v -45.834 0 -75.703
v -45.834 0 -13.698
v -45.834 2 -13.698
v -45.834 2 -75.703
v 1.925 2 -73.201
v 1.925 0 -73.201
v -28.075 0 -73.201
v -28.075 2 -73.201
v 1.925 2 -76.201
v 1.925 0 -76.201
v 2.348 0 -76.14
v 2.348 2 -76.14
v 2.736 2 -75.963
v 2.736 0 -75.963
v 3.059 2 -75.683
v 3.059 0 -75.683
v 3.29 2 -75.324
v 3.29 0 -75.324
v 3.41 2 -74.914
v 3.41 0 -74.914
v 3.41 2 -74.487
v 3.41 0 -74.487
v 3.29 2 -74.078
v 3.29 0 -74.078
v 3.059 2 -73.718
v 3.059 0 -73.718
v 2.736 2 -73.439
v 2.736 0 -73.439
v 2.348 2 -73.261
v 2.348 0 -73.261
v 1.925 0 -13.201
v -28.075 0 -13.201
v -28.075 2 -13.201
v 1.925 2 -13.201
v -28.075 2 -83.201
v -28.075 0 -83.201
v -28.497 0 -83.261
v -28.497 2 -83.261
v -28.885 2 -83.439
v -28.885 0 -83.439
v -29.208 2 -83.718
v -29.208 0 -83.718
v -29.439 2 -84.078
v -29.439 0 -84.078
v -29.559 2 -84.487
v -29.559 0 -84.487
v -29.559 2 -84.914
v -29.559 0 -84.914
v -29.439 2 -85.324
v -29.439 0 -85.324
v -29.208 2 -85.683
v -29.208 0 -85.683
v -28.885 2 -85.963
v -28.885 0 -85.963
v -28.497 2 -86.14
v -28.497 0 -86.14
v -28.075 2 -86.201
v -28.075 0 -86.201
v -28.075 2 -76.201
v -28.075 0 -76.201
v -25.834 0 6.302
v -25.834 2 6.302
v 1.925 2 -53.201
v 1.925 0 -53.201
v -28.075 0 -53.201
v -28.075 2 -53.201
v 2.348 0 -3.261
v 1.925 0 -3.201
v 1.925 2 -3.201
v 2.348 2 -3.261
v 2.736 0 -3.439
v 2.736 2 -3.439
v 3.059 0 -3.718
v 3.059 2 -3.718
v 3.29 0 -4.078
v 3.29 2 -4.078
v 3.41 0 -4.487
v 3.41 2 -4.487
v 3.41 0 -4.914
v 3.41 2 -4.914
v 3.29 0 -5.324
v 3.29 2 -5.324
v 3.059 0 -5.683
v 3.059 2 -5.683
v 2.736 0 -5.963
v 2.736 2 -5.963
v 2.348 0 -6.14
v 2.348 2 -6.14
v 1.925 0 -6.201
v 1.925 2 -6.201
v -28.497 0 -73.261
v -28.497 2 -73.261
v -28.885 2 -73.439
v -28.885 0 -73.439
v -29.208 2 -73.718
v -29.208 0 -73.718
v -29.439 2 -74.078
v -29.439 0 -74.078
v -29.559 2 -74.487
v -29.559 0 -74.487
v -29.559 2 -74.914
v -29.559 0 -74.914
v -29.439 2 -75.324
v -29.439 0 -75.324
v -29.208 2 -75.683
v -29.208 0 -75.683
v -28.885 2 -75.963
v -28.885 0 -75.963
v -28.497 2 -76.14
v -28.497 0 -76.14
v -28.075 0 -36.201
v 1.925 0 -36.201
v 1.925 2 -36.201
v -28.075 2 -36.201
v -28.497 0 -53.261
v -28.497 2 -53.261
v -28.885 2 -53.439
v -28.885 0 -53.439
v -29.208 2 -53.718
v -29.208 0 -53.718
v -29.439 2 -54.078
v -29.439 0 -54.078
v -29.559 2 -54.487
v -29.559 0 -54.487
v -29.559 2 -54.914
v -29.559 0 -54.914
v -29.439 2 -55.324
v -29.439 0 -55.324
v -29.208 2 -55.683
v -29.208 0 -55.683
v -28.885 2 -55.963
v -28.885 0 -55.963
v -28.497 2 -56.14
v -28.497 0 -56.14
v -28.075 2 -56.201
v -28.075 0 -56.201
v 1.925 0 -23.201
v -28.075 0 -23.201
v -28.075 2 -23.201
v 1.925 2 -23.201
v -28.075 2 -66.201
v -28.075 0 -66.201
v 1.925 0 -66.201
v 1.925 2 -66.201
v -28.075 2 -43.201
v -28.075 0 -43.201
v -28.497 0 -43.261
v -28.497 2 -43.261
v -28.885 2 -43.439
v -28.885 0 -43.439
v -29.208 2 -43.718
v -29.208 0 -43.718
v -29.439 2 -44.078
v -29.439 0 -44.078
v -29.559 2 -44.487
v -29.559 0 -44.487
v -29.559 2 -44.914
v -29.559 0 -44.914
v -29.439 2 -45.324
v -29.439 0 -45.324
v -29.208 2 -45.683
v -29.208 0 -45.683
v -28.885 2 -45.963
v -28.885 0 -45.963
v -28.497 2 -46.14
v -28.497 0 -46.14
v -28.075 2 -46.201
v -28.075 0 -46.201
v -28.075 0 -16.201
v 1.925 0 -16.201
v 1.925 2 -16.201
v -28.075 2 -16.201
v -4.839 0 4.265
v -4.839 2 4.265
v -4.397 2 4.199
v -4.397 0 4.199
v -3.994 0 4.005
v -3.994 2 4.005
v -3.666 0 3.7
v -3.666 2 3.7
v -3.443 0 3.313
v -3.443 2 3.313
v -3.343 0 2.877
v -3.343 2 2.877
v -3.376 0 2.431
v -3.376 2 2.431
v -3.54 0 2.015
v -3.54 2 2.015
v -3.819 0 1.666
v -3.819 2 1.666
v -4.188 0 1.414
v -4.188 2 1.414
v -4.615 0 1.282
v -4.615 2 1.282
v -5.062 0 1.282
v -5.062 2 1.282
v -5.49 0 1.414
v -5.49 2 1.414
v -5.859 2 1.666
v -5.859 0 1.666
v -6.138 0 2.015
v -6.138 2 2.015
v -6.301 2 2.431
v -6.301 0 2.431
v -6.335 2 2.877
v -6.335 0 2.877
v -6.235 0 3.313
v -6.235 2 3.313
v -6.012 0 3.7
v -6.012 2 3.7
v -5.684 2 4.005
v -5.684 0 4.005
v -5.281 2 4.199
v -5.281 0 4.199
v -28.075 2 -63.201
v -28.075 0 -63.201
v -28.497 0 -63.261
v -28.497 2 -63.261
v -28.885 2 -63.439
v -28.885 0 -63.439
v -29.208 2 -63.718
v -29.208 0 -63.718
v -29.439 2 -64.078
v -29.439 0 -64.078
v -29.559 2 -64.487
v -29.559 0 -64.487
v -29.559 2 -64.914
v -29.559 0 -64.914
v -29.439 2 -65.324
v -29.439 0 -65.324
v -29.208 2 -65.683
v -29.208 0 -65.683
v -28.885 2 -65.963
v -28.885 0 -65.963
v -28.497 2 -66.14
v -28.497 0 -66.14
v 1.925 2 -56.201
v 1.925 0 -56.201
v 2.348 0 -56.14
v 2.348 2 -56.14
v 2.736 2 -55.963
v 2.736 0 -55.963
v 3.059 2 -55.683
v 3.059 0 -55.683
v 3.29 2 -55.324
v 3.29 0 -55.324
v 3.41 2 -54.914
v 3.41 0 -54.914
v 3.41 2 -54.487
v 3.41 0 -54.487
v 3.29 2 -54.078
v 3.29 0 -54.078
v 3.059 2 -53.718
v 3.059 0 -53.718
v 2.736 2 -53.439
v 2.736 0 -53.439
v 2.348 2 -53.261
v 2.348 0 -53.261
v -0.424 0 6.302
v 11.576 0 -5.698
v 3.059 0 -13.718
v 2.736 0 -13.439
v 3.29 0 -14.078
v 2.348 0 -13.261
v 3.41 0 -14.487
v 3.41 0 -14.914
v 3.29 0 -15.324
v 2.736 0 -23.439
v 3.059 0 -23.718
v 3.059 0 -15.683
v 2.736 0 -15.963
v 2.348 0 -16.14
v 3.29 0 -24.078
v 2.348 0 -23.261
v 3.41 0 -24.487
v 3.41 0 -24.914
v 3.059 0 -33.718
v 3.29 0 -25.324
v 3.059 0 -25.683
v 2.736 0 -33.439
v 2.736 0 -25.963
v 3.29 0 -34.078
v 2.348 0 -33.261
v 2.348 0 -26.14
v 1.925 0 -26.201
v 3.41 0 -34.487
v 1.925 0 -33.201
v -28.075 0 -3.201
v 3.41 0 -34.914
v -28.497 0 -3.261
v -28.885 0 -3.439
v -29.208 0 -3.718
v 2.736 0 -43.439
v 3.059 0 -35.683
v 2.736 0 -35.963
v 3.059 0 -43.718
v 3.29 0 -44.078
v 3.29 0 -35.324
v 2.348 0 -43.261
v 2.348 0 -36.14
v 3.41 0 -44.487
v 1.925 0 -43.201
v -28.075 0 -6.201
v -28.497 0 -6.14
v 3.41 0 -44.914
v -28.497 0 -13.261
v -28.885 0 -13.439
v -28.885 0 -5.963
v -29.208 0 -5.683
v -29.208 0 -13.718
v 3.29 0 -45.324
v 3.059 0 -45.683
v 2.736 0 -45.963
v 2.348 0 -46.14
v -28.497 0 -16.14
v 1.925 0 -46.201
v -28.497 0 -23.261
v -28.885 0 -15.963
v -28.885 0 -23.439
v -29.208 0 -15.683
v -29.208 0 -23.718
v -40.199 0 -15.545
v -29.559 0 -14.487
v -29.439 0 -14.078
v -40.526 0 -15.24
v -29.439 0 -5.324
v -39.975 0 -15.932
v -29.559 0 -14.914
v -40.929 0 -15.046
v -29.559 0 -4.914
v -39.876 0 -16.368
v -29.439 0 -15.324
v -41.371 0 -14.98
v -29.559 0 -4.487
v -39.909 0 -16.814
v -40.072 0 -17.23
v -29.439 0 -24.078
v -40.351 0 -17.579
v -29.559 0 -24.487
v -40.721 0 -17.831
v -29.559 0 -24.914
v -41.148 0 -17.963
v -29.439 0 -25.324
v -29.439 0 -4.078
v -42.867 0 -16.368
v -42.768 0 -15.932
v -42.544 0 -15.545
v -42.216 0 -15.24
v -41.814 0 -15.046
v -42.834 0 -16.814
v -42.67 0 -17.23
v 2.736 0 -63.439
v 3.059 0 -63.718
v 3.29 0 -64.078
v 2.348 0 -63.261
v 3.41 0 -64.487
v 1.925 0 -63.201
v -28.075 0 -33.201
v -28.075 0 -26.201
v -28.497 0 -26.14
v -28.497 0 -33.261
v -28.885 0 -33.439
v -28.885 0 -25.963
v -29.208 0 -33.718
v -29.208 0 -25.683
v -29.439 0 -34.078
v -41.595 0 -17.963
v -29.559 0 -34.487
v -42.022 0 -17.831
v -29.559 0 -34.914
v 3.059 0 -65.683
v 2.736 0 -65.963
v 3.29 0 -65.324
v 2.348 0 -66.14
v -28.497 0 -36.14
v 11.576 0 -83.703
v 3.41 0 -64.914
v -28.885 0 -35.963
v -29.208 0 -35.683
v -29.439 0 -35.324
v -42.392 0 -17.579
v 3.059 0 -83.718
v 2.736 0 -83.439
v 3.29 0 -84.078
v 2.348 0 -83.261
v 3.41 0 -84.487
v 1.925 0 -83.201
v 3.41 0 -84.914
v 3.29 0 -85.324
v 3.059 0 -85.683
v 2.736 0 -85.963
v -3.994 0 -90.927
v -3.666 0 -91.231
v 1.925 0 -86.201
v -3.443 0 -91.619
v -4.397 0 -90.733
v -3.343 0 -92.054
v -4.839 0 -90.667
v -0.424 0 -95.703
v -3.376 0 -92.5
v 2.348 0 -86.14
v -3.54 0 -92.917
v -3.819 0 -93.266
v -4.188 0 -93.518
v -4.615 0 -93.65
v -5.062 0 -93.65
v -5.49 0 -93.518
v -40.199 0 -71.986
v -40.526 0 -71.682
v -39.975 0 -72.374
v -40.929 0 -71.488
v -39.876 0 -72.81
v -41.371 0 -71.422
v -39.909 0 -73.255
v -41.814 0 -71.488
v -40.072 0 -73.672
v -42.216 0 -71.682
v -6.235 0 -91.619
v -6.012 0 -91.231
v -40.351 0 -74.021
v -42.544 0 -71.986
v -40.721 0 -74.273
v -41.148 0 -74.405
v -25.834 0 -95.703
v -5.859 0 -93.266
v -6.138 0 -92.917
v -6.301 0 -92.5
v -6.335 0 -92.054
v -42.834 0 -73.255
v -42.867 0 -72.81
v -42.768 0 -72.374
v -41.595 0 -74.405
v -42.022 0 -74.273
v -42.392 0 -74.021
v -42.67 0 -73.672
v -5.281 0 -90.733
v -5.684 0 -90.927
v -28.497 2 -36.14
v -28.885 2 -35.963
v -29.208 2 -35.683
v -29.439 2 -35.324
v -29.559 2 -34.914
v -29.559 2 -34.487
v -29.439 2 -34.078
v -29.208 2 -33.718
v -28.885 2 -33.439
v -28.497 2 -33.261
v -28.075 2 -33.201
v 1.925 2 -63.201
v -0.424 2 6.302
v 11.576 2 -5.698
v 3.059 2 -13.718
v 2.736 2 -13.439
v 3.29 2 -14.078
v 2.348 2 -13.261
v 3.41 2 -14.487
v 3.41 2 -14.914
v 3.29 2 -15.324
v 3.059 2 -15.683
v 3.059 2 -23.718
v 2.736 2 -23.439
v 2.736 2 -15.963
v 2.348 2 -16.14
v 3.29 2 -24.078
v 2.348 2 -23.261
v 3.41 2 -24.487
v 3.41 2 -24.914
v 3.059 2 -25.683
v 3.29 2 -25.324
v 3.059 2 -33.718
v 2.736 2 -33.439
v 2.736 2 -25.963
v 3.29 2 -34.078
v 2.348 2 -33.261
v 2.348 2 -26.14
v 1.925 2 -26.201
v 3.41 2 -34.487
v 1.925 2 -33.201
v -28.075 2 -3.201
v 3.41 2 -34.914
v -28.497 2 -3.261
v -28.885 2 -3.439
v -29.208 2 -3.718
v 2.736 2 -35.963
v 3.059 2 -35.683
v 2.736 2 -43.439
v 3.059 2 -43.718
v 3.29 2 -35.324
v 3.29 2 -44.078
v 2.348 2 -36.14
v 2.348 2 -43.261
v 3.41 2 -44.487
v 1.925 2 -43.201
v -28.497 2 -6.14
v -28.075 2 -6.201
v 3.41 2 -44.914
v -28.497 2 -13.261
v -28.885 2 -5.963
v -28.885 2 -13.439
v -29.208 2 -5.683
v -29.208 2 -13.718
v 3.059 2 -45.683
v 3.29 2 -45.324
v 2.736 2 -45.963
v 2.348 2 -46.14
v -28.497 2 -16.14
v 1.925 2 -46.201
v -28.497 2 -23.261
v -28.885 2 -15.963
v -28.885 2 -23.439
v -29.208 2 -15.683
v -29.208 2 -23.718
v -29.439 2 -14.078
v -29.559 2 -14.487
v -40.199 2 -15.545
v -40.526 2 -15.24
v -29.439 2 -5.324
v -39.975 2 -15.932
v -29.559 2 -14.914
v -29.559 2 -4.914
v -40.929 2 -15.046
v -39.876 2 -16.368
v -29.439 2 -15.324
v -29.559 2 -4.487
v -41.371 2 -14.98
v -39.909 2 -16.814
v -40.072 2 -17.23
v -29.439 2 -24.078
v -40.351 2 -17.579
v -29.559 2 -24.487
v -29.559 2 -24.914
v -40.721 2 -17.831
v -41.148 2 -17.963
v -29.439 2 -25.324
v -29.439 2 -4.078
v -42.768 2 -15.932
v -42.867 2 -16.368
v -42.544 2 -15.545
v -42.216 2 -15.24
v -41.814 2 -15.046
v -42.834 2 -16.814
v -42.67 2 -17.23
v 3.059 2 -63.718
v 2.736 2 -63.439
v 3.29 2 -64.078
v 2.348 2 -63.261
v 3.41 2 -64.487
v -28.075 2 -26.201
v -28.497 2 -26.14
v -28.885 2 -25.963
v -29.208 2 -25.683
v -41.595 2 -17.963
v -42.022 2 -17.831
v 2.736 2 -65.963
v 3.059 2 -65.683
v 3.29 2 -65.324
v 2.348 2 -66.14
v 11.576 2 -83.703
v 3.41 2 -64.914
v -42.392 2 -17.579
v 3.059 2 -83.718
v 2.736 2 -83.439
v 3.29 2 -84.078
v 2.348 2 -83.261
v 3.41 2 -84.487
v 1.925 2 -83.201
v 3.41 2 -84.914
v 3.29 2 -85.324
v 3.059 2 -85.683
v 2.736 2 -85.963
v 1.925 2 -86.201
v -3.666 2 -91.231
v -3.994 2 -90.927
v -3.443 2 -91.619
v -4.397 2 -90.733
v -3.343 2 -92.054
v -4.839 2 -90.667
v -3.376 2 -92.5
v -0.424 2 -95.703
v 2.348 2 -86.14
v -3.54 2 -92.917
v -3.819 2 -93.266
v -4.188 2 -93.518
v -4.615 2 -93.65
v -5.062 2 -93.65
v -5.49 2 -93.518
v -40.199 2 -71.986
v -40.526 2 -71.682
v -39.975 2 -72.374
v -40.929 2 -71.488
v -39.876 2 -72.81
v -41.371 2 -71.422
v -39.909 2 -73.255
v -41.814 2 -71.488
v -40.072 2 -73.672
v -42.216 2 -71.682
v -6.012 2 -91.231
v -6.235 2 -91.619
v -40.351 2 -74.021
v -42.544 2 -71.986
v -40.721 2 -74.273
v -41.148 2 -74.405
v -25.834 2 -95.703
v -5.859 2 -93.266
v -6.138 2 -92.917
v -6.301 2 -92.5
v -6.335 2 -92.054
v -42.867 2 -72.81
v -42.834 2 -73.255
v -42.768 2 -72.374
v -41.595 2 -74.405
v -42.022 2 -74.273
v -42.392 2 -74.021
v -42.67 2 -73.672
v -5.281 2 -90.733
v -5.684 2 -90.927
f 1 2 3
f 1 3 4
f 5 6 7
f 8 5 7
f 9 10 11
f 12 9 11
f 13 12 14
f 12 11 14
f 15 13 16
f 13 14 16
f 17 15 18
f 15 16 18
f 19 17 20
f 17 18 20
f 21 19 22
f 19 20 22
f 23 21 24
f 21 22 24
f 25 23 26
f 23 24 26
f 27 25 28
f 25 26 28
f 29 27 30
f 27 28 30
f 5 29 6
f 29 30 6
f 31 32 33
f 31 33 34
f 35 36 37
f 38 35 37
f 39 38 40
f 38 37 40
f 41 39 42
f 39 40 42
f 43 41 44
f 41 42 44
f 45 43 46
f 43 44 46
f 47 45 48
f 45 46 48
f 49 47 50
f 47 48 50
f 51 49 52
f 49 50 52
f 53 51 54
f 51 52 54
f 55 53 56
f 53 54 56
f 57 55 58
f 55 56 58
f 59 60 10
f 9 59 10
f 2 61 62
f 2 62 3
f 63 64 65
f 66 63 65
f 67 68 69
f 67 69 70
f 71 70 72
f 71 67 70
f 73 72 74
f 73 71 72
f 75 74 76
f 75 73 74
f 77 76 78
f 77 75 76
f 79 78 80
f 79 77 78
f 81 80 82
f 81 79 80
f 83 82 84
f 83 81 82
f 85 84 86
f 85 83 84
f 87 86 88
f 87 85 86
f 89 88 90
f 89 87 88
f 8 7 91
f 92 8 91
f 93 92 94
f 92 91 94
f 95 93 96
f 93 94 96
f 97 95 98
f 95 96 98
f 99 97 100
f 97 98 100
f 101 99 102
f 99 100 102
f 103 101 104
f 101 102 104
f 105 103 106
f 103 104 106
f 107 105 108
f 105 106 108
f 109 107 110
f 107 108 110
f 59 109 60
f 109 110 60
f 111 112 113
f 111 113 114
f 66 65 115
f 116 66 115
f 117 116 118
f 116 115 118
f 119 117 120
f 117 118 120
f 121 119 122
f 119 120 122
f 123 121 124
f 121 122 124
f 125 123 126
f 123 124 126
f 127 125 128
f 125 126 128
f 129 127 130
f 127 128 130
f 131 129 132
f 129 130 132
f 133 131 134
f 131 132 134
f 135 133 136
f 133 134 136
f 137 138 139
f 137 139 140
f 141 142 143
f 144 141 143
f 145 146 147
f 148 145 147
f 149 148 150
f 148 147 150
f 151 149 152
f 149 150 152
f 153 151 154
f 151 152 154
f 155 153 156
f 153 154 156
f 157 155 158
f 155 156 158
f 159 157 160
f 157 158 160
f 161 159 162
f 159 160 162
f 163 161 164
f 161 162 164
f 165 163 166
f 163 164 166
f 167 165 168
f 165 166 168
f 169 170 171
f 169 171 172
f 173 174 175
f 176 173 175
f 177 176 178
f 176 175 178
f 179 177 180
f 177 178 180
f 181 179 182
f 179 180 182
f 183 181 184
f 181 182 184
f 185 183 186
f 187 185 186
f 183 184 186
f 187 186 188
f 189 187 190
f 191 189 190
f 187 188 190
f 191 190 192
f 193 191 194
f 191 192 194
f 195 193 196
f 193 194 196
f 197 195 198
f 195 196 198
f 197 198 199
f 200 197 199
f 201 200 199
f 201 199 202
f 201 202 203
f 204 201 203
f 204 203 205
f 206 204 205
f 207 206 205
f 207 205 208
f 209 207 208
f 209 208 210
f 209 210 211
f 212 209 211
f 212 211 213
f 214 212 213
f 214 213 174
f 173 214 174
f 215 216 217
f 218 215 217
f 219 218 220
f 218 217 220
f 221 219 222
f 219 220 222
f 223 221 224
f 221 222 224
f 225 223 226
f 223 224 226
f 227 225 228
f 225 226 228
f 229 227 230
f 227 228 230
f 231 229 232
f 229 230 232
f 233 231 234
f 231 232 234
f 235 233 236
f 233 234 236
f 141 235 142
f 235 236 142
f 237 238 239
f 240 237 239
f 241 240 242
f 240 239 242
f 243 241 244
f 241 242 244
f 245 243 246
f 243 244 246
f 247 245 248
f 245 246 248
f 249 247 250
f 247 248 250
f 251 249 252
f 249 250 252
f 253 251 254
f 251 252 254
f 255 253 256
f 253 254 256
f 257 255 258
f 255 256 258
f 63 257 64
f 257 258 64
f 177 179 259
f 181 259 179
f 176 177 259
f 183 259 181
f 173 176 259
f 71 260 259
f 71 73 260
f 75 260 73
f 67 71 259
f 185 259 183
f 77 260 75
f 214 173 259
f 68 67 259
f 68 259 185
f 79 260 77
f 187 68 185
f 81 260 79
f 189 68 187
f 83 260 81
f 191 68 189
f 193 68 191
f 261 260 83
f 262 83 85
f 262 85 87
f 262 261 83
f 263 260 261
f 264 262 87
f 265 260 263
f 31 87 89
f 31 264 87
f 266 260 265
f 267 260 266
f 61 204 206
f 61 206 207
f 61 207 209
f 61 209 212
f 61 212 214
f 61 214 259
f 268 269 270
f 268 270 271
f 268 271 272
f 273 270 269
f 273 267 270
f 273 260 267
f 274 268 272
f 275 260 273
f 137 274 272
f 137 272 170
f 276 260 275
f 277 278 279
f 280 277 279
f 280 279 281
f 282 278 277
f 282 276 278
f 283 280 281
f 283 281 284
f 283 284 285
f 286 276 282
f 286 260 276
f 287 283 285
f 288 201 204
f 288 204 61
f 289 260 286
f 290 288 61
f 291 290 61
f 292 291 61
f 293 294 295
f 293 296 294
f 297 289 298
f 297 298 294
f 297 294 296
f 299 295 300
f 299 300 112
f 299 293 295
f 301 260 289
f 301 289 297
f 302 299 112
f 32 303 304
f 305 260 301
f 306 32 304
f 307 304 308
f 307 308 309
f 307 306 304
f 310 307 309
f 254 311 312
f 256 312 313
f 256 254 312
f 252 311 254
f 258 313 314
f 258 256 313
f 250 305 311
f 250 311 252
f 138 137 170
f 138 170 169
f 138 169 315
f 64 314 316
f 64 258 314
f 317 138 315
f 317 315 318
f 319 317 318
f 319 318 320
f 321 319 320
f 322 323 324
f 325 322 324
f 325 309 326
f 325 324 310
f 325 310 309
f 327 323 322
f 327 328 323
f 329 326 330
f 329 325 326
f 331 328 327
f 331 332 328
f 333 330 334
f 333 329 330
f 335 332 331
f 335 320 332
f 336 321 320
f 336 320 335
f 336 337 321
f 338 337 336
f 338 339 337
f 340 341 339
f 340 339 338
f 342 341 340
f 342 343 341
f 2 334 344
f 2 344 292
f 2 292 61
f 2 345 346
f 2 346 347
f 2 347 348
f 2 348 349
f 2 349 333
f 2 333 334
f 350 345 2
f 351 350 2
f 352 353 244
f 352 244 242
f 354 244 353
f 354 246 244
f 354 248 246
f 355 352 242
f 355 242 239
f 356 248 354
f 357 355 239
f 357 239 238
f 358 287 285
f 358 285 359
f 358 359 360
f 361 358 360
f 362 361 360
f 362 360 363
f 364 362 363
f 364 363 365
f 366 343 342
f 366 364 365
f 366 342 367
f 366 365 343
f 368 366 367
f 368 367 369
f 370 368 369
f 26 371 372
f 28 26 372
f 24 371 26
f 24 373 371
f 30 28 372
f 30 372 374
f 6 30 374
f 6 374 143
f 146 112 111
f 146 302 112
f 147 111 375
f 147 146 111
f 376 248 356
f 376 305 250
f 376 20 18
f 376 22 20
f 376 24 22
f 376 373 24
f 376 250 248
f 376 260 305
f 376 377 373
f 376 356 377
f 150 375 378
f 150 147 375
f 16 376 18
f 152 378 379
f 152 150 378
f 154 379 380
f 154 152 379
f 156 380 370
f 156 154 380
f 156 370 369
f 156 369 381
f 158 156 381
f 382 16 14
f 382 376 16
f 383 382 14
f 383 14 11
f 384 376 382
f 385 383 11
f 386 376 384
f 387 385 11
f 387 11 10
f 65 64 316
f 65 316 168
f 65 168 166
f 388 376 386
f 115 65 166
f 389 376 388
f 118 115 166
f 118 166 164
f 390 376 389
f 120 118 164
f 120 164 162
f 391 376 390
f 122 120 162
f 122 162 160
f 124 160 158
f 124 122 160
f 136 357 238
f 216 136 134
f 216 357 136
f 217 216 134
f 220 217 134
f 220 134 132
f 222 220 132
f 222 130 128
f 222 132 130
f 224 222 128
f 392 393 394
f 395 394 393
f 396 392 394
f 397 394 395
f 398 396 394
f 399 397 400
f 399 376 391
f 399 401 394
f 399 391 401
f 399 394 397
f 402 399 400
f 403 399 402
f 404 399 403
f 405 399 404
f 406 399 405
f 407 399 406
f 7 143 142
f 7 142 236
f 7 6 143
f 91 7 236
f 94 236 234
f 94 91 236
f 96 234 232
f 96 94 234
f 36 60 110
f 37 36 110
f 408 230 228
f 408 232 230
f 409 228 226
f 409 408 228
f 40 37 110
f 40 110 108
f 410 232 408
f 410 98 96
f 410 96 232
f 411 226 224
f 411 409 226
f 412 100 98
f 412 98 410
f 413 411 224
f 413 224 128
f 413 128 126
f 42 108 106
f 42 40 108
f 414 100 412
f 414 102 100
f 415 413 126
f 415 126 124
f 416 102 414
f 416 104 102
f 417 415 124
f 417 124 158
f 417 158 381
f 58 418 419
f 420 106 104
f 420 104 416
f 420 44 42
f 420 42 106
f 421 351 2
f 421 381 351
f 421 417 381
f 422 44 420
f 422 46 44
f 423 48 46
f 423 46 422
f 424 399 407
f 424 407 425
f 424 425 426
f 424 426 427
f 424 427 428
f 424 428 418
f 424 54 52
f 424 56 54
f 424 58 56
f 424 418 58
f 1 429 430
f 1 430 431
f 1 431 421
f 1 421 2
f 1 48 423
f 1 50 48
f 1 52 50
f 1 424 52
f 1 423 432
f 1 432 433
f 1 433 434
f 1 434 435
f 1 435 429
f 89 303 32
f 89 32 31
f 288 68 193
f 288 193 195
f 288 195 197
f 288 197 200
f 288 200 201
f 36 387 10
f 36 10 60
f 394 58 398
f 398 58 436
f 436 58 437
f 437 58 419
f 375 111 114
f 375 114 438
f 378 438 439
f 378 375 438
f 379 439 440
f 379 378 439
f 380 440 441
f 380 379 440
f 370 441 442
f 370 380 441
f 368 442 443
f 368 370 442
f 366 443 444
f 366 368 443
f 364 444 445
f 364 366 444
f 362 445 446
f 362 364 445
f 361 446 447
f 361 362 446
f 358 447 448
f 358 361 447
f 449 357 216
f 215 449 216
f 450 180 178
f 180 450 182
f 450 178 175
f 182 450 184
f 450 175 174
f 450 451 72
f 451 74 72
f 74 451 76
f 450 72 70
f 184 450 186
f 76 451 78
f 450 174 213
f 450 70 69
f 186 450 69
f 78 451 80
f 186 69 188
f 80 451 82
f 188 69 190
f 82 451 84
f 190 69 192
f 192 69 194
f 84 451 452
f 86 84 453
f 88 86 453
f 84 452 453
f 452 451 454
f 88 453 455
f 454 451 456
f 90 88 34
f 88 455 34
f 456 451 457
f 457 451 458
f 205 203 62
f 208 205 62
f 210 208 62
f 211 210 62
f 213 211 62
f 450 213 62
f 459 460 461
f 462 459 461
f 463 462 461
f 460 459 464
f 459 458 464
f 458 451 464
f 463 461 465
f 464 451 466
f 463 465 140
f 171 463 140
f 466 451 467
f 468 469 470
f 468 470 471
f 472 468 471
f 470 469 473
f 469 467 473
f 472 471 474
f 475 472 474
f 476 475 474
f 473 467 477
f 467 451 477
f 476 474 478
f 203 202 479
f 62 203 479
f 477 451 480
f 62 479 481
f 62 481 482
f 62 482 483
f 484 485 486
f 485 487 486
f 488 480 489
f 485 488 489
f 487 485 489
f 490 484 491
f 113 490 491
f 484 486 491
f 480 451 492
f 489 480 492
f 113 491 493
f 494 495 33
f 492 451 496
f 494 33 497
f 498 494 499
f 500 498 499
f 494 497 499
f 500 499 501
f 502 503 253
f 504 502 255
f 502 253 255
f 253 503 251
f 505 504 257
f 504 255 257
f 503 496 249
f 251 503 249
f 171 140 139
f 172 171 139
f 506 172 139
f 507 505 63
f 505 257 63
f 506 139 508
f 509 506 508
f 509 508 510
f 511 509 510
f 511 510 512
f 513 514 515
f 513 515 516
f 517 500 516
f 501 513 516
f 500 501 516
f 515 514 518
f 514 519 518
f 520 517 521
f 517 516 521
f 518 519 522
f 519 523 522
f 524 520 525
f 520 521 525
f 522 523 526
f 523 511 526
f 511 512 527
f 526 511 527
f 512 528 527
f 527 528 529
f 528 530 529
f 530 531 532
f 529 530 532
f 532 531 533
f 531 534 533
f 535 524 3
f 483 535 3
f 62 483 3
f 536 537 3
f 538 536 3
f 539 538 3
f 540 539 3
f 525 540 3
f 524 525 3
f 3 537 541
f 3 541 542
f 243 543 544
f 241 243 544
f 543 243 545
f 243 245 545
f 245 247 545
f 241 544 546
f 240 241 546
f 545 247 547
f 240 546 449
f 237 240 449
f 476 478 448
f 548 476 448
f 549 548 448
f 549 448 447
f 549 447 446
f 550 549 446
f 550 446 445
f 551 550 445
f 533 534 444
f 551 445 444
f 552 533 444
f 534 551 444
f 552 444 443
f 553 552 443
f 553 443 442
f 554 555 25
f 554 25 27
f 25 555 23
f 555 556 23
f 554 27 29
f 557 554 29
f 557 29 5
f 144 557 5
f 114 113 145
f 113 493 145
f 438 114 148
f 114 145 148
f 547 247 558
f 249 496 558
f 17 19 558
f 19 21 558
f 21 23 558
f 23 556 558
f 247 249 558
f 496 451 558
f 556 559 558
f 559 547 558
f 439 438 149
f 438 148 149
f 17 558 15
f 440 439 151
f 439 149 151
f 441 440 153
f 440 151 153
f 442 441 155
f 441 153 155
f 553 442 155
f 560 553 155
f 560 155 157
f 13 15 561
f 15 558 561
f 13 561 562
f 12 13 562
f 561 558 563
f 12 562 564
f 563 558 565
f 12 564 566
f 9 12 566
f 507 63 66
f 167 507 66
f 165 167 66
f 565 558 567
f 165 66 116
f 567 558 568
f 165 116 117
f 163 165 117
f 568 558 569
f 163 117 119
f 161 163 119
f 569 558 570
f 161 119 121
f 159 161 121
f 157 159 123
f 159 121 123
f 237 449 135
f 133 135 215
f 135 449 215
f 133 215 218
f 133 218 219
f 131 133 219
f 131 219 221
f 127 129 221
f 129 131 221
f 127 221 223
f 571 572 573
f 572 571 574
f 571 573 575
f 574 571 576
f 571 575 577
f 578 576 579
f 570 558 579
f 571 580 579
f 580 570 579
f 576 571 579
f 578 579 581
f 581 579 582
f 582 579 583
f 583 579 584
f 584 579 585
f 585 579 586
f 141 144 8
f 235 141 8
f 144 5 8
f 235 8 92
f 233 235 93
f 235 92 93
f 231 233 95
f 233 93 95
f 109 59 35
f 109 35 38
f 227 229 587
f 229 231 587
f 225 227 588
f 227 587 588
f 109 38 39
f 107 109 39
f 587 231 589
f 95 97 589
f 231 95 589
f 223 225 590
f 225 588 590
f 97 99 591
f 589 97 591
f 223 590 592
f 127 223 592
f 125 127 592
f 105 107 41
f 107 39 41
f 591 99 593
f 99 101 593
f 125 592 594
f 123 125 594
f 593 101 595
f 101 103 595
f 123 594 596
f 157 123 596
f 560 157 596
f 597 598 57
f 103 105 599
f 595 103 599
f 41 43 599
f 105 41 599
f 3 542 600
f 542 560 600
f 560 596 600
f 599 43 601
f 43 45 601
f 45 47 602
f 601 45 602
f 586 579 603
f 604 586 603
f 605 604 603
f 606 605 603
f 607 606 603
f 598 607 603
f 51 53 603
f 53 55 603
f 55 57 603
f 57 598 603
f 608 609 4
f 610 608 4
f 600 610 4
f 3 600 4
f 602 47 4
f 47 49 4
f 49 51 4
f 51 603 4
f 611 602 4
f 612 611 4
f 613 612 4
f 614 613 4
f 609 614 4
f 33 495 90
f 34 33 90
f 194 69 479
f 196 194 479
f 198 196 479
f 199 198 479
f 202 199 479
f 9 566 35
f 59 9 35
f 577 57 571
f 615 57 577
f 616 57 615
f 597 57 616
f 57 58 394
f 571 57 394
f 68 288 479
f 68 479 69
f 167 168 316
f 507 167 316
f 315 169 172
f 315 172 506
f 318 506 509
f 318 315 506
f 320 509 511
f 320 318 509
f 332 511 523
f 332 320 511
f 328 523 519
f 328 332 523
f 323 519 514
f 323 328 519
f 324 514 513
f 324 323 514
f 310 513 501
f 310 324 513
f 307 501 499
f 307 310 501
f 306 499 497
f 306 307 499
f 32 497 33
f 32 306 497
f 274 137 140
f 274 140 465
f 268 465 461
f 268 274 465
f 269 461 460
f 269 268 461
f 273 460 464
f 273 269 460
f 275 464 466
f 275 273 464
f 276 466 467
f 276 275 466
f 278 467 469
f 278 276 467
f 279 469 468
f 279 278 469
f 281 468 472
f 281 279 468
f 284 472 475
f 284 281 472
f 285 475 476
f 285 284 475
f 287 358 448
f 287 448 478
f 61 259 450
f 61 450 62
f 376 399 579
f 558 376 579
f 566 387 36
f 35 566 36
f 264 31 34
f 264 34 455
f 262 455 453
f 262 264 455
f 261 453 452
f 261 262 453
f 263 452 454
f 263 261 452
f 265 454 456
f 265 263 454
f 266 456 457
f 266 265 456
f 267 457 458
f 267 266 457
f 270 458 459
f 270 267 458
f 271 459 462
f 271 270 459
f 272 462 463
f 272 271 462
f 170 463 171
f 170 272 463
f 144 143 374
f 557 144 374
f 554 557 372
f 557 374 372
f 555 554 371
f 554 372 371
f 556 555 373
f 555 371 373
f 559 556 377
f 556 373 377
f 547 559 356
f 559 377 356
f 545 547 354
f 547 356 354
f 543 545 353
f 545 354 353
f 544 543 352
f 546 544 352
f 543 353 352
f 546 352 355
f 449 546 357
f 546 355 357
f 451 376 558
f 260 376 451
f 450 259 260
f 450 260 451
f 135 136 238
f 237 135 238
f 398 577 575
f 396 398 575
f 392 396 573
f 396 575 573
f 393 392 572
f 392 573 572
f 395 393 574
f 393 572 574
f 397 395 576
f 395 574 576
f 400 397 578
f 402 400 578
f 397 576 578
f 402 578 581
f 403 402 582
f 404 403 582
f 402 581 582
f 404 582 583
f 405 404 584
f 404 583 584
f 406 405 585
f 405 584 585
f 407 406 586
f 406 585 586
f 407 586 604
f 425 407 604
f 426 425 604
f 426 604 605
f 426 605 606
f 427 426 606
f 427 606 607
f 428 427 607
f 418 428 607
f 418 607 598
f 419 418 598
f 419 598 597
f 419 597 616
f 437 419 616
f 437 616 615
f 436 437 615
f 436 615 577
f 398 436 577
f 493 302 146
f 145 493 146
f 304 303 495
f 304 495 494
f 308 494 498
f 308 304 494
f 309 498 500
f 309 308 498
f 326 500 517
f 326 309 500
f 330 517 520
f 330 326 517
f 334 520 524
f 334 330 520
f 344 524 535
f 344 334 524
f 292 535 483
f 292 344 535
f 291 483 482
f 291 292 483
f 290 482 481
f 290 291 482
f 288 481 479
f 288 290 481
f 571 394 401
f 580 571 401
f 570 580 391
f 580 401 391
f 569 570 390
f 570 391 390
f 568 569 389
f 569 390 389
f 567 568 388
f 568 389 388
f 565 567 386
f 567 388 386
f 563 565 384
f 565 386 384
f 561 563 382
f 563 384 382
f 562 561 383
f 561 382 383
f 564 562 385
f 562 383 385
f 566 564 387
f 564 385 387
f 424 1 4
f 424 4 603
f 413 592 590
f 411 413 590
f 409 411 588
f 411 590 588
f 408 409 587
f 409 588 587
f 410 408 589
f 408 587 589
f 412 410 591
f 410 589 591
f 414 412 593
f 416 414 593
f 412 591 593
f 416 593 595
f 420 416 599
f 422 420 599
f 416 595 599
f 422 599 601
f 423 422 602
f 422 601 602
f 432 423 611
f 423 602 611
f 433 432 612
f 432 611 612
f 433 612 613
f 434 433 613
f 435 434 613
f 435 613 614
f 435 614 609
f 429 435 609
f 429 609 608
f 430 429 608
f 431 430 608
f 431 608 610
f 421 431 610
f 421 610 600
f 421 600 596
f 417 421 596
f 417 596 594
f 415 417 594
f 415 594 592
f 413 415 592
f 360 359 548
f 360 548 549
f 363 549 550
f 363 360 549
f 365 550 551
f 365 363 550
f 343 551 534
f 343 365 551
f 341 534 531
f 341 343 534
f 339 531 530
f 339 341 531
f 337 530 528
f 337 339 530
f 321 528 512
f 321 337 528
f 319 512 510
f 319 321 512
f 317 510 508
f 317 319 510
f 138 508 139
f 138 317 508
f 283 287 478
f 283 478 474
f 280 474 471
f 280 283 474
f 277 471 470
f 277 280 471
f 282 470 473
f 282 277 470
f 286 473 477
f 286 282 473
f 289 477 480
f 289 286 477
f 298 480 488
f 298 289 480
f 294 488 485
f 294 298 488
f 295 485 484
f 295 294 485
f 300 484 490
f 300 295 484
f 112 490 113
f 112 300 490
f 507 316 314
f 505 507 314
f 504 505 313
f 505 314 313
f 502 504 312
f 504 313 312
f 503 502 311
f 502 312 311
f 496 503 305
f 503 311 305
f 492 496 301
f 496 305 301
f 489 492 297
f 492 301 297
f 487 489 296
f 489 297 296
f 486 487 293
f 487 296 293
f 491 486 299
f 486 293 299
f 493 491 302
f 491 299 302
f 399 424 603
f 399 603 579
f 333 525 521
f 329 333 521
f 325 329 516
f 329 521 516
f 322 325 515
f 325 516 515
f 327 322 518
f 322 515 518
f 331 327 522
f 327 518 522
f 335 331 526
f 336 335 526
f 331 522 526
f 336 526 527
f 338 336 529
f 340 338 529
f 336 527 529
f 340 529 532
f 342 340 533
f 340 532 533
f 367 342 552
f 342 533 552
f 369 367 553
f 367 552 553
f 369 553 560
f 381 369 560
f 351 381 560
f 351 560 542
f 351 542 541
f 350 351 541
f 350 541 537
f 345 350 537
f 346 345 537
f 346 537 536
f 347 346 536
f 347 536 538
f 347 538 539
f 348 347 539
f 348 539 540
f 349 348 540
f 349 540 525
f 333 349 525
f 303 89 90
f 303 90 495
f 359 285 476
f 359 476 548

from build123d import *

# Parameters (mm, degrees)
BOSS_EXTRUDE1_DEPTH = 2
CHAMFER1_SIZE       = 12
SKETCH2_R           = 1.5
CUT_EXTRUDE1_DEPTH  = 10


with BuildPart() as part:
    # Sketch1 → Boss-Extrude1 (new body)
    with BuildSketch(Plane(origin=(0, 0, 0), x_dir=(1, 0, 0), z_dir=(0, 1, 0))):
        Polygon((-25.833763343, 95.703211573), (11.576236657, 95.703211573), (11.576236657, -6.301788427), (-25.833763343, -6.301788427), (-45.833763343, 13.698211573), (-45.833763343, 75.703211573), align=None)
        with BuildLine():
            Line((1.925471464, 43.200711573), (-28.074528536, 43.200711573))
            ThreePointArc((-28.074528536, 43.200711573), (-29.574528536, 44.700711573), (-28.074528536, 46.200711573))
            Line((-28.074528536, 46.200711573), (1.925471464, 46.200711573))
            ThreePointArc((1.925471464, 46.200711573), (3.425471464, 44.700711573), (1.925471464, 43.200711573))
        make_face(mode=Mode.SUBTRACT)
        with BuildLine():
            Line((1.925471464, 53.200711573), (-28.074528536, 53.200711573))
            ThreePointArc((-28.074528536, 53.200711573), (-29.574528536, 54.700711573), (-28.074528536, 56.200711573))
            Line((-28.074528536, 56.200711573), (1.925471464, 56.200711573))
            ThreePointArc((1.925471464, 56.200711573), (3.425471464, 54.700711573), (1.925471464, 53.200711573))
        make_face(mode=Mode.SUBTRACT)
        with BuildLine():
            Line((1.925471464, 63.200711573), (-28.074528536, 63.200711573))
            ThreePointArc((-28.074528536, 63.200711573), (-29.574528536, 64.700711573), (-28.074528536, 66.200711573))
            Line((-28.074528536, 66.200711573), (1.925471464, 66.200711573))
            ThreePointArc((1.925471464, 66.200711573), (3.425471464, 64.700711573), (1.925471464, 63.200711573))
        make_face(mode=Mode.SUBTRACT)
        with BuildLine():
            Line((1.925471464, 73.200711573), (-28.074528536, 73.200711573))
            ThreePointArc((-28.074528536, 73.200711573), (-29.574528536, 74.700711573), (-28.074528536, 76.200711573))
            Line((-28.074528536, 76.200711573), (1.925471464, 76.200711573))
            ThreePointArc((1.925471464, 76.200711573), (3.425471464, 74.700711573), (1.925471464, 73.200711573))
        make_face(mode=Mode.SUBTRACT)
        with BuildLine():
            Line((1.925471464, 83.200711573), (-28.074528536, 83.200711573))
            ThreePointArc((-28.074528536, 83.200711573), (-29.574528536, 84.700711573), (-28.074528536, 86.200711573))
            Line((-28.074528536, 86.200711573), (1.925471464, 86.200711573))
            ThreePointArc((1.925471464, 86.200711573), (3.425471464, 84.700711573), (1.925471464, 83.200711573))
        make_face(mode=Mode.SUBTRACT)
        with BuildLine():
            Line((1.925471464, 36.200711573), (-28.074528536, 36.200711573))
            ThreePointArc((-28.074528536, 36.200711573), (-29.574528536, 34.700711573), (-28.074528536, 33.200711573))
            Line((-28.074528536, 33.200711573), (1.925471464, 33.200711573))
            ThreePointArc((1.925471464, 33.200711573), (3.425471464, 34.700711573), (1.925471464, 36.200711573))
        make_face(mode=Mode.SUBTRACT)
        with BuildLine():
            Line((1.925471464, 26.200711573), (-28.074528536, 26.200711573))
            ThreePointArc((-28.074528536, 26.200711573), (-29.574528536, 24.700711573), (-28.074528536, 23.200711573))
            Line((-28.074528536, 23.200711573), (1.925471464, 23.200711573))
            ThreePointArc((1.925471464, 23.200711573), (3.425471464, 24.700711573), (1.925471464, 26.200711573))
        make_face(mode=Mode.SUBTRACT)
        with BuildLine():
            Line((1.925471464, 16.200711573), (-28.074528536, 16.200711573))
            ThreePointArc((-28.074528536, 16.200711573), (-29.574528536, 14.700711573), (-28.074528536, 13.200711573))
            Line((-28.074528536, 13.200711573), (1.925471464, 13.200711573))
            ThreePointArc((1.925471464, 13.200711573), (3.425471464, 14.700711573), (1.925471464, 16.200711573))
        make_face(mode=Mode.SUBTRACT)
        with BuildLine():
            Line((1.925471464, 6.200711573), (-28.074528536, 6.200711573))
            ThreePointArc((-28.074528536, 6.200711573), (-29.574528536, 4.700711573), (-28.074528536, 3.200711573))
            Line((-28.074528536, 3.200711573), (1.925471464, 3.200711573))
            ThreePointArc((1.925471464, 3.200711573), (3.425471464, 4.700711573), (1.925471464, 6.200711573))
        make_face(mode=Mode.SUBTRACT)
    extrude(amount=BOSS_EXTRUDE1_DEPTH)

    # Chamfer1
    chamfer1_edges = [part.edges().sort_by_distance(p)[0] for p in [
        (11.576236657, 1, -95.703211573),
        (11.576236657, 1, 6.301788427),
    ]]
    chamfer(chamfer1_edges, length=CHAMFER1_SIZE)

    # Sketch2 → Cut-Extrude1 (cut)
    with BuildSketch(Plane(origin=(0, 2, 0), x_dir=(1, 0, 0), z_dir=(0, 1, 0))):
        with Locations(Location((-4.838827122, 92.166588575, 0), (0, 0, 270))):
            Circle(SKETCH2_R)
        with Locations(Location((-41.371381926, 72.921675145, 0), (0, 0, 270))):
            Circle(SKETCH2_R)
        with Locations(Location((-41.371381926, 16.479748001, 0), (0, 0, 270))):
            Circle(SKETCH2_R)
        with Locations(Location((-4.838827122, -2.765165428, 0), (0, 0, 270))):
            Circle(SKETCH2_R)
    extrude(amount=-CUT_EXTRUDE1_DEPTH, mode=Mode.SUBTRACT)


solid = part.part
